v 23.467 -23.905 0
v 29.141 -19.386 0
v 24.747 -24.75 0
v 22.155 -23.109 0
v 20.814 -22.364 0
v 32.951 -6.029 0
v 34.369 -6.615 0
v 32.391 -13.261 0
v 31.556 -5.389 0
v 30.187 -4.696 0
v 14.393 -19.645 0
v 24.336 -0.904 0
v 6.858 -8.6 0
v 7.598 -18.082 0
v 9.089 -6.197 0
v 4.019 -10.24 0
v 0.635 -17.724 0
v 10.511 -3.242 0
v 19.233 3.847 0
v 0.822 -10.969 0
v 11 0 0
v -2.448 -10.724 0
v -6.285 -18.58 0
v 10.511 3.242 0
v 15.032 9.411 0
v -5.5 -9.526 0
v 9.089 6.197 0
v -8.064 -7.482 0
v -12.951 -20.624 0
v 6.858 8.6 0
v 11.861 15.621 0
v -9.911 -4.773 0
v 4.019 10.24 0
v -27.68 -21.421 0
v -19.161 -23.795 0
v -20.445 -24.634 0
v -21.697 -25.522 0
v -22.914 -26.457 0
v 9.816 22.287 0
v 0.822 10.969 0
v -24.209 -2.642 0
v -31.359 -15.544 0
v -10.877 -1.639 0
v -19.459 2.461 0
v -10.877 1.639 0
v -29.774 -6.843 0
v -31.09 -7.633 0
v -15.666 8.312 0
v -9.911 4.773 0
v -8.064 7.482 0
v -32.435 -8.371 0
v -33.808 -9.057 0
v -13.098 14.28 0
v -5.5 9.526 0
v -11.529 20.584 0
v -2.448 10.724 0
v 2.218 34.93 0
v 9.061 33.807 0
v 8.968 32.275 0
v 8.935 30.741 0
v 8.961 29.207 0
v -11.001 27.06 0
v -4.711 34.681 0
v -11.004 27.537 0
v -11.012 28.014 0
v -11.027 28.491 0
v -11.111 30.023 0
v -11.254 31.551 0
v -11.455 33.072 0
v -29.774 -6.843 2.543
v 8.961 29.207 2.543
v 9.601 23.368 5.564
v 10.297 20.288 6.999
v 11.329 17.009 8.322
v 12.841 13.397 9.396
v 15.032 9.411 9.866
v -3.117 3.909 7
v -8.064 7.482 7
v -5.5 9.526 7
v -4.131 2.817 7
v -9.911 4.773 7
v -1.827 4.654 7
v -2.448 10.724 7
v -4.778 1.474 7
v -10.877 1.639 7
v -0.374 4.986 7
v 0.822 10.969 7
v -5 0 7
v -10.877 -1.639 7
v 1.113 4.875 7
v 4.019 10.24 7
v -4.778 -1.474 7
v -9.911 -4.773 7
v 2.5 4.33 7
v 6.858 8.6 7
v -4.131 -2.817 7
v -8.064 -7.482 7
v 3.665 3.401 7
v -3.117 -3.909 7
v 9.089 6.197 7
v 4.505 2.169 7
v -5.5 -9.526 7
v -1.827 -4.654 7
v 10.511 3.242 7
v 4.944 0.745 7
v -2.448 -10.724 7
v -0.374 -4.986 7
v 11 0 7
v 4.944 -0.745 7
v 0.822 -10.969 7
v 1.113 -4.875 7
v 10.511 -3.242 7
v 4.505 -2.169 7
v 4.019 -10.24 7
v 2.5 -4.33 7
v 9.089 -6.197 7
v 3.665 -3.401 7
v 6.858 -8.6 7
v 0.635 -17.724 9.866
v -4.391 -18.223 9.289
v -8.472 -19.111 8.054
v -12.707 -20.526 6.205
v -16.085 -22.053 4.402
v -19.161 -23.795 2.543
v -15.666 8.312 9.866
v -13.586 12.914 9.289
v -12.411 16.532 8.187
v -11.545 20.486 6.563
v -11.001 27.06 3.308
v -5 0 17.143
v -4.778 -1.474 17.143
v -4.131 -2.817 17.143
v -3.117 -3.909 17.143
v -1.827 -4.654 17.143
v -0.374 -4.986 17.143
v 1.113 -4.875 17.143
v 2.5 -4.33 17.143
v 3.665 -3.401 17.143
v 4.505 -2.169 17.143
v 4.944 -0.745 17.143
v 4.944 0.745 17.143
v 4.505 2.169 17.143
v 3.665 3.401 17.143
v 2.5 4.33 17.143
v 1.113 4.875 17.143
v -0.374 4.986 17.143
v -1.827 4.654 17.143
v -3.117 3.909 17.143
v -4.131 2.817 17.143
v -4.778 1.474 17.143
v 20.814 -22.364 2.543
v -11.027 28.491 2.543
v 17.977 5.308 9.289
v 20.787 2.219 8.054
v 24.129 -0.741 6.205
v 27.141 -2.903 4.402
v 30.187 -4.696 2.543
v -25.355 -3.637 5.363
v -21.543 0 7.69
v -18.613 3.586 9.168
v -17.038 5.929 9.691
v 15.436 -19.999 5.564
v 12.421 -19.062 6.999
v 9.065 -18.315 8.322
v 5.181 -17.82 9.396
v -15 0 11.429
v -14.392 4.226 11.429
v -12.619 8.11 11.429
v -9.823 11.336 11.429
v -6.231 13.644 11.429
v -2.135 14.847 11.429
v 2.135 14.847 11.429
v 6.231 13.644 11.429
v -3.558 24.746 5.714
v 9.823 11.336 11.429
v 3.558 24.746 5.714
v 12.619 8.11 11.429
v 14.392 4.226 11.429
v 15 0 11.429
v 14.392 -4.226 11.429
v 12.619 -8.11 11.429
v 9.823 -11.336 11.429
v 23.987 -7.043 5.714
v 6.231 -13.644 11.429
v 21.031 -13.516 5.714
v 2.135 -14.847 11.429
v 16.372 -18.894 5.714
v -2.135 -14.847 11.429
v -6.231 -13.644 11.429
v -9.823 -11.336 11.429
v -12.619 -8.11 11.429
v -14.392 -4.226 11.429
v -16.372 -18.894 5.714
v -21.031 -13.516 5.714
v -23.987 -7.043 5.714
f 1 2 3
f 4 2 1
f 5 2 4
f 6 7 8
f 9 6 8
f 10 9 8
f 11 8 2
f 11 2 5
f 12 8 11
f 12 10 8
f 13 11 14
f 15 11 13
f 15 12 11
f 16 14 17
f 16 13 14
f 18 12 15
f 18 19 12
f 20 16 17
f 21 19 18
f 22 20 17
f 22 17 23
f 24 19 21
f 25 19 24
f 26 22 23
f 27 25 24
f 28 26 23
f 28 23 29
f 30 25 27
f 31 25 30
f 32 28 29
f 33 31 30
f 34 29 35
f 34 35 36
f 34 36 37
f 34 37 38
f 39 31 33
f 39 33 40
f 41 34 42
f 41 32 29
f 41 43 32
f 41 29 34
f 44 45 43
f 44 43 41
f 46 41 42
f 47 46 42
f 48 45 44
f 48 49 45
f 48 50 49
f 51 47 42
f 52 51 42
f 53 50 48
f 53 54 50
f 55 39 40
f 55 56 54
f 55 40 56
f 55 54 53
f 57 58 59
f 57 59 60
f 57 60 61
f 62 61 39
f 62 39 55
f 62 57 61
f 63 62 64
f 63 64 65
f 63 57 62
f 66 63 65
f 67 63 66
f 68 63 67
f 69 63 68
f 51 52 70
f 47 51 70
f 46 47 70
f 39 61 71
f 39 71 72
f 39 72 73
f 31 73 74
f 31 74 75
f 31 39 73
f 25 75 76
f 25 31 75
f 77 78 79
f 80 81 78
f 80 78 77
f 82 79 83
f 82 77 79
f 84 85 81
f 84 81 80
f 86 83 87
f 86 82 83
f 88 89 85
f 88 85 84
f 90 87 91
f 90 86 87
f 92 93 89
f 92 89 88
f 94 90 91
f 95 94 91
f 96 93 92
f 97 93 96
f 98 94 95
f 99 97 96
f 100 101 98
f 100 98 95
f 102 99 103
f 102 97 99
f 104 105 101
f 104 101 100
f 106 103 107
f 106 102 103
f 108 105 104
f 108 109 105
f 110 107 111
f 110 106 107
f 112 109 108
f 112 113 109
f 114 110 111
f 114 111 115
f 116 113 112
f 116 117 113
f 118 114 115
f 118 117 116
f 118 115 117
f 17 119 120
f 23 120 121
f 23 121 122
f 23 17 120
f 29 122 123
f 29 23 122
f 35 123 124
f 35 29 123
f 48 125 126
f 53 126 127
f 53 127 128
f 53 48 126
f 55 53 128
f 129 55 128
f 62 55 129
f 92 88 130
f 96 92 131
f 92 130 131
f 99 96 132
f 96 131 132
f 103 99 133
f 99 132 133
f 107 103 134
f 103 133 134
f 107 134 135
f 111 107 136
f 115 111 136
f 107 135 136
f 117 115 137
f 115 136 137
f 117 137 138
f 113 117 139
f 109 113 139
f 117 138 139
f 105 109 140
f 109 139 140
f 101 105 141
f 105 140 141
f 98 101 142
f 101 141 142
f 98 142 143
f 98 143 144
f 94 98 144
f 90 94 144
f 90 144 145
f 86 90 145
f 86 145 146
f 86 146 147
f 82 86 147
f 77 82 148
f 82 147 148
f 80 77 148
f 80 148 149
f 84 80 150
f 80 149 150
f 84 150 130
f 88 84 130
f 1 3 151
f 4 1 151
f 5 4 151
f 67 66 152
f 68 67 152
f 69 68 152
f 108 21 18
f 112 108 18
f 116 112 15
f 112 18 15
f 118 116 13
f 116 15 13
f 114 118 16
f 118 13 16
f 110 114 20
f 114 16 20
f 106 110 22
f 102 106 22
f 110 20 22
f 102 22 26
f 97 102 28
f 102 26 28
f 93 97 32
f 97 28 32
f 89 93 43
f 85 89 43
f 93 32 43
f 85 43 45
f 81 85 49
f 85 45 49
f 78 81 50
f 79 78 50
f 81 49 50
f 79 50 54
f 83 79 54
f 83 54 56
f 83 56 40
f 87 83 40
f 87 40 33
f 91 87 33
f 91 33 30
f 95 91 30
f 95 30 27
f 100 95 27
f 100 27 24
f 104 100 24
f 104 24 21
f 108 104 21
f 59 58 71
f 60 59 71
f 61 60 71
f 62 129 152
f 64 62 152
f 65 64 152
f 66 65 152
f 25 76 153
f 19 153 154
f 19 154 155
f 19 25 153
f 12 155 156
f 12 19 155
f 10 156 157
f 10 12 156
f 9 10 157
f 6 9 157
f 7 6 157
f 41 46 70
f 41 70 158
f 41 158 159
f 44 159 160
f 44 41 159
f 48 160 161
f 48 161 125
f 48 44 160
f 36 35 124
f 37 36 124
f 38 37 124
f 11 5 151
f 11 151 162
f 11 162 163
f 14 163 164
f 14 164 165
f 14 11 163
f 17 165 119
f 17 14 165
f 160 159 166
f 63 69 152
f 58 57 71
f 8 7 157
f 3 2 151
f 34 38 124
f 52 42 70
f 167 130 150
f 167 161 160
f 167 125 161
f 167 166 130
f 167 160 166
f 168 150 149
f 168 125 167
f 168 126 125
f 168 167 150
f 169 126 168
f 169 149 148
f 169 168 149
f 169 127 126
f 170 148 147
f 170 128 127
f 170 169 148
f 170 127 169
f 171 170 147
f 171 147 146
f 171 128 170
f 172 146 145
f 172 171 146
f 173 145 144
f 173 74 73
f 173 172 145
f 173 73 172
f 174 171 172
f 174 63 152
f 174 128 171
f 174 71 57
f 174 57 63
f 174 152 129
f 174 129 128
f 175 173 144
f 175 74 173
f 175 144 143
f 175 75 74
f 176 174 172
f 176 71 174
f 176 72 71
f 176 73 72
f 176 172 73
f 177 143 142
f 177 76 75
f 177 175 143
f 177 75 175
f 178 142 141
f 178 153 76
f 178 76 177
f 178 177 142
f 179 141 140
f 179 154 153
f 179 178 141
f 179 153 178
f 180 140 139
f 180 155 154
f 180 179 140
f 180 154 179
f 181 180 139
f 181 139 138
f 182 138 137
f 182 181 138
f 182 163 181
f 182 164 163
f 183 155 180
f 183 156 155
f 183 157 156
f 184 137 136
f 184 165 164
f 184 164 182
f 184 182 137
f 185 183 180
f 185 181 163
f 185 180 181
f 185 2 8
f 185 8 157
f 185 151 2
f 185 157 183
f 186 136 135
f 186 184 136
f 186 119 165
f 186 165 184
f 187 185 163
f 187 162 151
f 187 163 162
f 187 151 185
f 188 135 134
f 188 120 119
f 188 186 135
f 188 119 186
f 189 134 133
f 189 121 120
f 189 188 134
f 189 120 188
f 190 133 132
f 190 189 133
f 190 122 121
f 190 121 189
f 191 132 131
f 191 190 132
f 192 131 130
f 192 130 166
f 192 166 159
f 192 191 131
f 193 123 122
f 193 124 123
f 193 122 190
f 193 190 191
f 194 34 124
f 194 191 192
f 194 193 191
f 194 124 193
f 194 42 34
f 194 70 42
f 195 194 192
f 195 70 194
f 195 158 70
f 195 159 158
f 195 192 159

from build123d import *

# Parameters (mm, degrees)
F3_DEPTH       = 25
F4_D           = 10
F4_CBORE_D     = 22
F4_CBORE_DEPTH = 7


with BuildPart() as f1:
    # F0 (on Front) → F1 (revolve)
    with BuildSketch(Plane.XZ):
        Polygon((-35, 0), (0, 0), (0, 20), align=None)
    revolve(axis=Axis((0, 0, 10), (0, 0, -1)))

    # F2 (on Top) → F3 (cut)
    with BuildSketch(Plane.XY):
        with BuildLine():
            Line((2.0660725, -57.6980474345), (20.8136189308, -22.3635104654))
            ThreePointArc((20.8136189308, -22.3635104654), (11.0295606596, -18.7152835508), (0.6346554831, -17.7236675729))
            Line((0.6346554831, -17.7236675729), (2.0660725, -57.6980474345))
        make_face()
        with BuildLine():
            ThreePointArc((-19.1607609308, -23.7949274822), (-17.310803703, -92.6914277888), (42.0660725, -57.6980474345))
            ThreePointArc((42.0660725, -57.6980474345), (36.3436297148, -37.0813291849), (20.8136189308, -22.3635104654))
            Line((20.8136189308, -22.3635104654), (2.0660725, -57.6980474345))
            Line((2.0660725, -57.6980474345), (-19.1607609308, -23.7949274822))
        make_face()
        with BuildLine():
            ThreePointArc((0.6346554831, -17.7236675729), (-9.6627009891, -19.4562395217), (-19.1607609308, -23.7949274822))
            Line((-19.1607609308, -23.7949274822), (2.0660725, -57.6980474345))
            Line((2.0660725, -57.6980474345), (0.6346554831, -17.7236675729))
        make_face()
        with BuildLine():
            Line((48.9349385771, 30.6382949883), (30.1873921462, -4.6962419808))
            ThreePointArc((30.1873921462, -4.6962419808), (69.5516568267, -3.6392622266), (88.9349385771, 30.6382949883))
            ThreePointArc((88.9349385771, 30.6382949883), (48.2191154377, 70.6318894408), (8.9605587154, 29.2068779715))
            Line((8.9605587154, 29.2068779715), (48.9349385771, 30.6382949883))
        make_face()
        with BuildLine():
            ThreePointArc((8.9605587154, 29.2068779715), (10.6931306643, 18.9095214992), (15.0318186248, 9.4114615575))
            Line((15.0318186248, 9.4114615575), (48.9349385771, 30.6382949883))
            Line((48.9349385771, 30.6382949883), (8.9605587154, 29.2068779715))
        make_face()
        with BuildLine():
            ThreePointArc((15.0318186248, 9.4114615575), (21.6809481825, 1.3599752351), (30.1873921462, -4.6962419808))
            Line((30.1873921462, -4.6962419808), (48.9349385771, 30.6382949883))
            Line((48.9349385771, 30.6382949883), (15.0318186248, 9.4114615575))
        make_face()
        with BuildLine():
            ThreePointArc((-11.0266312154, 28.4911694631), (-86.3355480462, 45.8072988771), (-29.7741776462, -6.8433675061))
            Line((-29.7741776462, -6.8433675061), (-51.001011077, 27.0597524462))
            Line((-51.001011077, 27.0597524462), (-11.0266312154, 28.4911694631))
        make_face()
        with BuildLine():
            ThreePointArc((-11.001011077, 27.0597524462), (-11.0074166245, 27.7755755856), (-11.0266312154, 28.4911694631))
            Line((-11.0266312154, 28.4911694631), (-51.001011077, 27.0597524462))
            Line((-51.001011077, 27.0597524462), (-15.6664741079, 8.3122060154))
            ThreePointArc((-15.6664741079, 8.3122060154), (-12.1848966478, 17.4000805772), (-11.001011077, 27.0597524462))
        make_face()
        with BuildLine():
            Line((-51.001011077, 27.0597524462), (-29.7741776462, -6.8433675061))
            ThreePointArc((-29.7741776462, -6.8433675061), (-21.7226913238, -0.1942379484), (-15.6664741079, 8.3122060154))
            Line((-15.6664741079, 8.3122060154), (-51.001011077, 27.0597524462))
        make_face()
    extrude(amount=F3_DEPTH, mode=Mode.SUBTRACT)

    # F4 (through all)
    with Locations(Plane(origin=(0, 0, 0), x_dir=(1, 0, 0), z_dir=(0, 0, -1))):
        with Locations((0, 0)):
            CounterBoreHole(F4_D / 2, F4_CBORE_D / 2, F4_CBORE_DEPTH)


solid = f1.part
